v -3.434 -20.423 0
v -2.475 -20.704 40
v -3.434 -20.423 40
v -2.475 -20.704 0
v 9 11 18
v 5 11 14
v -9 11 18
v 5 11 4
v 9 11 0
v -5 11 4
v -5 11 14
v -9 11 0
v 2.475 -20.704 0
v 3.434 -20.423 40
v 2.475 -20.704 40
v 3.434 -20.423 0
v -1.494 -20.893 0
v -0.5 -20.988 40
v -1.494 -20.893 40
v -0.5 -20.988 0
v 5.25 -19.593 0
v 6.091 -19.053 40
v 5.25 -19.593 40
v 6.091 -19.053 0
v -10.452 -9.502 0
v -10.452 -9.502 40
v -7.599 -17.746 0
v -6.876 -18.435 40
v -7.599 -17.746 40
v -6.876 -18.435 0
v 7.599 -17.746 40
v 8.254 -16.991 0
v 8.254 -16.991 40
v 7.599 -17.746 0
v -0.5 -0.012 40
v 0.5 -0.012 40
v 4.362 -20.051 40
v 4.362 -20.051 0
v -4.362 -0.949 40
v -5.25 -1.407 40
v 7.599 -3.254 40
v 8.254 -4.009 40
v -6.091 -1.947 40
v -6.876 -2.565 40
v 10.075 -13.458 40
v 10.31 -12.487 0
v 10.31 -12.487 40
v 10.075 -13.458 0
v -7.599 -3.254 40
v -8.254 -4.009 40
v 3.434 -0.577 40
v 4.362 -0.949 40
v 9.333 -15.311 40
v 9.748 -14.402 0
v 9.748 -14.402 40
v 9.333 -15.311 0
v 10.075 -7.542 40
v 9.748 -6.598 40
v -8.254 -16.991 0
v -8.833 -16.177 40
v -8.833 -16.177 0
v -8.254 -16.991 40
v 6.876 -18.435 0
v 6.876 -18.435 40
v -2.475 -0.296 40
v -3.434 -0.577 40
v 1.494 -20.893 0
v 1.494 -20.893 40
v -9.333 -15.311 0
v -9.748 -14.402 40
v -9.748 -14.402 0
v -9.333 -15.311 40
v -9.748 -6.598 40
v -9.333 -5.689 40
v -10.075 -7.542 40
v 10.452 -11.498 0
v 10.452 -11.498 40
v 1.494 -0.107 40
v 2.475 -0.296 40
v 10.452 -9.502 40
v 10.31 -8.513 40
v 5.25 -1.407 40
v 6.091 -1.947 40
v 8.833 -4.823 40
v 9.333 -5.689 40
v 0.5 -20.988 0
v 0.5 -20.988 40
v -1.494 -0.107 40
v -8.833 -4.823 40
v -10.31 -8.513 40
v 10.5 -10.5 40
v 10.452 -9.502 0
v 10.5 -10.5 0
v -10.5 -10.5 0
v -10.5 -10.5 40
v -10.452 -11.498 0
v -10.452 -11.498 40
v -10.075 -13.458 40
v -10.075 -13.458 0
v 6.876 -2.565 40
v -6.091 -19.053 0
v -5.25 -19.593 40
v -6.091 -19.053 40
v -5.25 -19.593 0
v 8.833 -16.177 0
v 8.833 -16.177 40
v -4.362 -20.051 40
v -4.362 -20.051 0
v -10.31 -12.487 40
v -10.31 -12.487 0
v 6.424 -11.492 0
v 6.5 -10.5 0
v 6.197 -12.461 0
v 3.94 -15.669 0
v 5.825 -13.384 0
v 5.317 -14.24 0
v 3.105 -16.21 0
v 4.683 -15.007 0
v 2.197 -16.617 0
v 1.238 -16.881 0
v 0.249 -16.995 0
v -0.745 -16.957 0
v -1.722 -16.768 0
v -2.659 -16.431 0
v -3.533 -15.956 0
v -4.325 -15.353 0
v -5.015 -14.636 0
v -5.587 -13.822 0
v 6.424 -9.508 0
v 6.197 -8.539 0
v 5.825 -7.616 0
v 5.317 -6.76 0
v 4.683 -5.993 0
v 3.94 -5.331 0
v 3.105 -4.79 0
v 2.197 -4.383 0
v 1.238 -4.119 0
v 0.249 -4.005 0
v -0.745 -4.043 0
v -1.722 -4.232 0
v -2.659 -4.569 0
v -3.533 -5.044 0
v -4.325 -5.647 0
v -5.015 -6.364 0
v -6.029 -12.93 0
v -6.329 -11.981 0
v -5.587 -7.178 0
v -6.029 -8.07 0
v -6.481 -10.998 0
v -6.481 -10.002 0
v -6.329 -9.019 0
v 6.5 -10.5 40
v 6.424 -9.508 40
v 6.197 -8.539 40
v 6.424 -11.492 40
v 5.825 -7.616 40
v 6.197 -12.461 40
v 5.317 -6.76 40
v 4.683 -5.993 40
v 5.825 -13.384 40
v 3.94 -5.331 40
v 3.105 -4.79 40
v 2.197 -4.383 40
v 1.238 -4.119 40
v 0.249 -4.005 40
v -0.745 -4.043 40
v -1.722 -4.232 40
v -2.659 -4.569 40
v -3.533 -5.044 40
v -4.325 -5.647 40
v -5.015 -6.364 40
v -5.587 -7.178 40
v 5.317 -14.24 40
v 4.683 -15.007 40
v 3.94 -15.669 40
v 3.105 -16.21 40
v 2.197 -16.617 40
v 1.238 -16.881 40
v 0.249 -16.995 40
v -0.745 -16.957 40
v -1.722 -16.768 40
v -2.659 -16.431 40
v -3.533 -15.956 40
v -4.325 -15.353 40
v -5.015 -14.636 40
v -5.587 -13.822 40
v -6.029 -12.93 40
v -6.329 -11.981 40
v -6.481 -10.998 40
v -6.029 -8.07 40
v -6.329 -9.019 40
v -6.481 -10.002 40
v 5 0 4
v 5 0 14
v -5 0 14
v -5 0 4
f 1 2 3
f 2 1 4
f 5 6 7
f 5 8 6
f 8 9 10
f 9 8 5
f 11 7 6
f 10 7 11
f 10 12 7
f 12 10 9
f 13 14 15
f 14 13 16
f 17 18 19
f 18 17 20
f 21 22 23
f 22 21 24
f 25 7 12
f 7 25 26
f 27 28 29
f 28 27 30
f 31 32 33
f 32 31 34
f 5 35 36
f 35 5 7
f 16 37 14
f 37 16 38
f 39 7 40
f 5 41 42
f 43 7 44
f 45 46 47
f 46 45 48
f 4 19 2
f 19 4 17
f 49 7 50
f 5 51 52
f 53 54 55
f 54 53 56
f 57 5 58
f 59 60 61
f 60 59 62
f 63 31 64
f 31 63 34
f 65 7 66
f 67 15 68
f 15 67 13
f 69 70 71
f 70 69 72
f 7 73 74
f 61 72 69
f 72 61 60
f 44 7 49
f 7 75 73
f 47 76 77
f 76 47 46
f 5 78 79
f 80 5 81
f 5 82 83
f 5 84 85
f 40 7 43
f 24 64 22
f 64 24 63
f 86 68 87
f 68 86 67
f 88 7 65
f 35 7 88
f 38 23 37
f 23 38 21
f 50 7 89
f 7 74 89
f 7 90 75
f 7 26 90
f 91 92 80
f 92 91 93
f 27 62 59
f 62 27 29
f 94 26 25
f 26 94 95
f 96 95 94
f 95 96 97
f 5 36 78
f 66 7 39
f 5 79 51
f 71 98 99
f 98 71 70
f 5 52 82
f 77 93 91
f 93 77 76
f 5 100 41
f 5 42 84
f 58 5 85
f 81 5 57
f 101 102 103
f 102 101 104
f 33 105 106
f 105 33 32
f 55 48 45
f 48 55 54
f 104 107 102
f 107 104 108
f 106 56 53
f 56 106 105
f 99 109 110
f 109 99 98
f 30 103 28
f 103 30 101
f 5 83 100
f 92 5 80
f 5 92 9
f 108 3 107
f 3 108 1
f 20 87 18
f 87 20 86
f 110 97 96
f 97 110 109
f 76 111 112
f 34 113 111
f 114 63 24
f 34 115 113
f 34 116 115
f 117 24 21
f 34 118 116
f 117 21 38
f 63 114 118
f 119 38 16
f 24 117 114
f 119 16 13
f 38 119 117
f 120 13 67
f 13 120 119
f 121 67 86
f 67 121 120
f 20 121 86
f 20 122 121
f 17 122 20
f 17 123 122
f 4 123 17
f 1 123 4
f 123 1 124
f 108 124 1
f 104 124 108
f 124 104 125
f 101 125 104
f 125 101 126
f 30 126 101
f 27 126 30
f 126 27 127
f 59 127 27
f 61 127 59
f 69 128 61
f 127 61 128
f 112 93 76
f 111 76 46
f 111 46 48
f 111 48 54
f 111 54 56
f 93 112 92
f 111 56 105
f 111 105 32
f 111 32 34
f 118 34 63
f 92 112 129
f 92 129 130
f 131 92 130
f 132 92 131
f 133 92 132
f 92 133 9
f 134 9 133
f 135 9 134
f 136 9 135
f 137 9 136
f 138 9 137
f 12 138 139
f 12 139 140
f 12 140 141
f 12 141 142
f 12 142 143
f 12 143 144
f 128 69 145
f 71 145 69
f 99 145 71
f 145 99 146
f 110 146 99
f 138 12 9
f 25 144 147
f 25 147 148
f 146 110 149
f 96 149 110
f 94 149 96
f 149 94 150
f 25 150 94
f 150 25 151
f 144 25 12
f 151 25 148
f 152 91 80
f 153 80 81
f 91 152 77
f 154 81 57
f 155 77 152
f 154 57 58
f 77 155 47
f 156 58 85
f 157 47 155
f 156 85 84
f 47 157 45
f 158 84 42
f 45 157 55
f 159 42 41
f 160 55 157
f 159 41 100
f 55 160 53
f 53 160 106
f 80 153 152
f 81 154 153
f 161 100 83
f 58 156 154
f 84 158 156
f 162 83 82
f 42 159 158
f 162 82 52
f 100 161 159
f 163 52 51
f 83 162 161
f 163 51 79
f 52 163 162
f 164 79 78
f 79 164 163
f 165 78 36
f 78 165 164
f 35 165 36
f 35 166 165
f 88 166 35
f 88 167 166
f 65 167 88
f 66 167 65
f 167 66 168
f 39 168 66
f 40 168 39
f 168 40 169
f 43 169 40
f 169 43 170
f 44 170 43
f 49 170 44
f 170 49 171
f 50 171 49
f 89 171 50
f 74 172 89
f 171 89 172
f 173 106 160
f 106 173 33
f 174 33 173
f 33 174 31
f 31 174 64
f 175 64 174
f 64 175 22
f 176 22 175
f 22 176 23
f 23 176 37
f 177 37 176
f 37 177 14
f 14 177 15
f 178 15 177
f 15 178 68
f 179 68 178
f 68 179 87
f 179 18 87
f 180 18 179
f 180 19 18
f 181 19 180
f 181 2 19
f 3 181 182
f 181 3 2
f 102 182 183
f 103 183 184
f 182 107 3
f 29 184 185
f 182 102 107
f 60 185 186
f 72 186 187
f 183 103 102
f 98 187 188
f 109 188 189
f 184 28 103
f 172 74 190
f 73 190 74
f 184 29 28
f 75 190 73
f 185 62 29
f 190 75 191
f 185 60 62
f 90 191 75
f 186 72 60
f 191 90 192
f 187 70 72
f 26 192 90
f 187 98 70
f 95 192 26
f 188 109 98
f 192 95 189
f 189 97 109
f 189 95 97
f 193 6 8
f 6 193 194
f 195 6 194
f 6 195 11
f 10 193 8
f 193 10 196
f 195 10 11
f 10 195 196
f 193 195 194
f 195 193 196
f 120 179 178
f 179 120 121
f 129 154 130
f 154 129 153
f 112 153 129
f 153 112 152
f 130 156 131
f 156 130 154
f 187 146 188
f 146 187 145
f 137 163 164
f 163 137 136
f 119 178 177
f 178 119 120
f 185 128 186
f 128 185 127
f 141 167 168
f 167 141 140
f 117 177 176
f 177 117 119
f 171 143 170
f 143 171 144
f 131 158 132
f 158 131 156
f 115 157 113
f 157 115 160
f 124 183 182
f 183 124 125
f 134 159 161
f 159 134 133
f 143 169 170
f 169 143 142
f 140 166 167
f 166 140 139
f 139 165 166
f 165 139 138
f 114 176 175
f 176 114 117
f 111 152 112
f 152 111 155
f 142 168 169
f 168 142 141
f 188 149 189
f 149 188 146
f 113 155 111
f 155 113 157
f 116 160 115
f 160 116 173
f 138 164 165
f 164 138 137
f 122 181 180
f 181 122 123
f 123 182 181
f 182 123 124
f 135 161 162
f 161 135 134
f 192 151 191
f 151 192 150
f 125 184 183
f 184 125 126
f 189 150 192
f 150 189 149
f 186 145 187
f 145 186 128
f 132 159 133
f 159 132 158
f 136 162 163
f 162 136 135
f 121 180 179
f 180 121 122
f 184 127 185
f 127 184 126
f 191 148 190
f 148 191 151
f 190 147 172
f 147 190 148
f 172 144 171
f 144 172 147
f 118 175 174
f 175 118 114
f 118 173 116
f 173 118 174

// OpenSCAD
$fa=1/1;
$fs=1/1;
bissl=1/100;
d=13;
l_tube=40;
square=10;
l_square=11;
wall=4;

difference(){
  hull(){
    translate([-square/2-wall,0,0])cube([square+2*wall,l_square,square+2*wall]);
    translate([0,-d/2-wall,0])cylinder(d=d+2*wall,h=l_tube);
  }
    translate([-square/2,0,wall])cube([square,l_square+bissl,square]);
    translate([0,-d/2-wall,-bissl])cylinder(d=d,h=l_tube+2*bissl);
}
